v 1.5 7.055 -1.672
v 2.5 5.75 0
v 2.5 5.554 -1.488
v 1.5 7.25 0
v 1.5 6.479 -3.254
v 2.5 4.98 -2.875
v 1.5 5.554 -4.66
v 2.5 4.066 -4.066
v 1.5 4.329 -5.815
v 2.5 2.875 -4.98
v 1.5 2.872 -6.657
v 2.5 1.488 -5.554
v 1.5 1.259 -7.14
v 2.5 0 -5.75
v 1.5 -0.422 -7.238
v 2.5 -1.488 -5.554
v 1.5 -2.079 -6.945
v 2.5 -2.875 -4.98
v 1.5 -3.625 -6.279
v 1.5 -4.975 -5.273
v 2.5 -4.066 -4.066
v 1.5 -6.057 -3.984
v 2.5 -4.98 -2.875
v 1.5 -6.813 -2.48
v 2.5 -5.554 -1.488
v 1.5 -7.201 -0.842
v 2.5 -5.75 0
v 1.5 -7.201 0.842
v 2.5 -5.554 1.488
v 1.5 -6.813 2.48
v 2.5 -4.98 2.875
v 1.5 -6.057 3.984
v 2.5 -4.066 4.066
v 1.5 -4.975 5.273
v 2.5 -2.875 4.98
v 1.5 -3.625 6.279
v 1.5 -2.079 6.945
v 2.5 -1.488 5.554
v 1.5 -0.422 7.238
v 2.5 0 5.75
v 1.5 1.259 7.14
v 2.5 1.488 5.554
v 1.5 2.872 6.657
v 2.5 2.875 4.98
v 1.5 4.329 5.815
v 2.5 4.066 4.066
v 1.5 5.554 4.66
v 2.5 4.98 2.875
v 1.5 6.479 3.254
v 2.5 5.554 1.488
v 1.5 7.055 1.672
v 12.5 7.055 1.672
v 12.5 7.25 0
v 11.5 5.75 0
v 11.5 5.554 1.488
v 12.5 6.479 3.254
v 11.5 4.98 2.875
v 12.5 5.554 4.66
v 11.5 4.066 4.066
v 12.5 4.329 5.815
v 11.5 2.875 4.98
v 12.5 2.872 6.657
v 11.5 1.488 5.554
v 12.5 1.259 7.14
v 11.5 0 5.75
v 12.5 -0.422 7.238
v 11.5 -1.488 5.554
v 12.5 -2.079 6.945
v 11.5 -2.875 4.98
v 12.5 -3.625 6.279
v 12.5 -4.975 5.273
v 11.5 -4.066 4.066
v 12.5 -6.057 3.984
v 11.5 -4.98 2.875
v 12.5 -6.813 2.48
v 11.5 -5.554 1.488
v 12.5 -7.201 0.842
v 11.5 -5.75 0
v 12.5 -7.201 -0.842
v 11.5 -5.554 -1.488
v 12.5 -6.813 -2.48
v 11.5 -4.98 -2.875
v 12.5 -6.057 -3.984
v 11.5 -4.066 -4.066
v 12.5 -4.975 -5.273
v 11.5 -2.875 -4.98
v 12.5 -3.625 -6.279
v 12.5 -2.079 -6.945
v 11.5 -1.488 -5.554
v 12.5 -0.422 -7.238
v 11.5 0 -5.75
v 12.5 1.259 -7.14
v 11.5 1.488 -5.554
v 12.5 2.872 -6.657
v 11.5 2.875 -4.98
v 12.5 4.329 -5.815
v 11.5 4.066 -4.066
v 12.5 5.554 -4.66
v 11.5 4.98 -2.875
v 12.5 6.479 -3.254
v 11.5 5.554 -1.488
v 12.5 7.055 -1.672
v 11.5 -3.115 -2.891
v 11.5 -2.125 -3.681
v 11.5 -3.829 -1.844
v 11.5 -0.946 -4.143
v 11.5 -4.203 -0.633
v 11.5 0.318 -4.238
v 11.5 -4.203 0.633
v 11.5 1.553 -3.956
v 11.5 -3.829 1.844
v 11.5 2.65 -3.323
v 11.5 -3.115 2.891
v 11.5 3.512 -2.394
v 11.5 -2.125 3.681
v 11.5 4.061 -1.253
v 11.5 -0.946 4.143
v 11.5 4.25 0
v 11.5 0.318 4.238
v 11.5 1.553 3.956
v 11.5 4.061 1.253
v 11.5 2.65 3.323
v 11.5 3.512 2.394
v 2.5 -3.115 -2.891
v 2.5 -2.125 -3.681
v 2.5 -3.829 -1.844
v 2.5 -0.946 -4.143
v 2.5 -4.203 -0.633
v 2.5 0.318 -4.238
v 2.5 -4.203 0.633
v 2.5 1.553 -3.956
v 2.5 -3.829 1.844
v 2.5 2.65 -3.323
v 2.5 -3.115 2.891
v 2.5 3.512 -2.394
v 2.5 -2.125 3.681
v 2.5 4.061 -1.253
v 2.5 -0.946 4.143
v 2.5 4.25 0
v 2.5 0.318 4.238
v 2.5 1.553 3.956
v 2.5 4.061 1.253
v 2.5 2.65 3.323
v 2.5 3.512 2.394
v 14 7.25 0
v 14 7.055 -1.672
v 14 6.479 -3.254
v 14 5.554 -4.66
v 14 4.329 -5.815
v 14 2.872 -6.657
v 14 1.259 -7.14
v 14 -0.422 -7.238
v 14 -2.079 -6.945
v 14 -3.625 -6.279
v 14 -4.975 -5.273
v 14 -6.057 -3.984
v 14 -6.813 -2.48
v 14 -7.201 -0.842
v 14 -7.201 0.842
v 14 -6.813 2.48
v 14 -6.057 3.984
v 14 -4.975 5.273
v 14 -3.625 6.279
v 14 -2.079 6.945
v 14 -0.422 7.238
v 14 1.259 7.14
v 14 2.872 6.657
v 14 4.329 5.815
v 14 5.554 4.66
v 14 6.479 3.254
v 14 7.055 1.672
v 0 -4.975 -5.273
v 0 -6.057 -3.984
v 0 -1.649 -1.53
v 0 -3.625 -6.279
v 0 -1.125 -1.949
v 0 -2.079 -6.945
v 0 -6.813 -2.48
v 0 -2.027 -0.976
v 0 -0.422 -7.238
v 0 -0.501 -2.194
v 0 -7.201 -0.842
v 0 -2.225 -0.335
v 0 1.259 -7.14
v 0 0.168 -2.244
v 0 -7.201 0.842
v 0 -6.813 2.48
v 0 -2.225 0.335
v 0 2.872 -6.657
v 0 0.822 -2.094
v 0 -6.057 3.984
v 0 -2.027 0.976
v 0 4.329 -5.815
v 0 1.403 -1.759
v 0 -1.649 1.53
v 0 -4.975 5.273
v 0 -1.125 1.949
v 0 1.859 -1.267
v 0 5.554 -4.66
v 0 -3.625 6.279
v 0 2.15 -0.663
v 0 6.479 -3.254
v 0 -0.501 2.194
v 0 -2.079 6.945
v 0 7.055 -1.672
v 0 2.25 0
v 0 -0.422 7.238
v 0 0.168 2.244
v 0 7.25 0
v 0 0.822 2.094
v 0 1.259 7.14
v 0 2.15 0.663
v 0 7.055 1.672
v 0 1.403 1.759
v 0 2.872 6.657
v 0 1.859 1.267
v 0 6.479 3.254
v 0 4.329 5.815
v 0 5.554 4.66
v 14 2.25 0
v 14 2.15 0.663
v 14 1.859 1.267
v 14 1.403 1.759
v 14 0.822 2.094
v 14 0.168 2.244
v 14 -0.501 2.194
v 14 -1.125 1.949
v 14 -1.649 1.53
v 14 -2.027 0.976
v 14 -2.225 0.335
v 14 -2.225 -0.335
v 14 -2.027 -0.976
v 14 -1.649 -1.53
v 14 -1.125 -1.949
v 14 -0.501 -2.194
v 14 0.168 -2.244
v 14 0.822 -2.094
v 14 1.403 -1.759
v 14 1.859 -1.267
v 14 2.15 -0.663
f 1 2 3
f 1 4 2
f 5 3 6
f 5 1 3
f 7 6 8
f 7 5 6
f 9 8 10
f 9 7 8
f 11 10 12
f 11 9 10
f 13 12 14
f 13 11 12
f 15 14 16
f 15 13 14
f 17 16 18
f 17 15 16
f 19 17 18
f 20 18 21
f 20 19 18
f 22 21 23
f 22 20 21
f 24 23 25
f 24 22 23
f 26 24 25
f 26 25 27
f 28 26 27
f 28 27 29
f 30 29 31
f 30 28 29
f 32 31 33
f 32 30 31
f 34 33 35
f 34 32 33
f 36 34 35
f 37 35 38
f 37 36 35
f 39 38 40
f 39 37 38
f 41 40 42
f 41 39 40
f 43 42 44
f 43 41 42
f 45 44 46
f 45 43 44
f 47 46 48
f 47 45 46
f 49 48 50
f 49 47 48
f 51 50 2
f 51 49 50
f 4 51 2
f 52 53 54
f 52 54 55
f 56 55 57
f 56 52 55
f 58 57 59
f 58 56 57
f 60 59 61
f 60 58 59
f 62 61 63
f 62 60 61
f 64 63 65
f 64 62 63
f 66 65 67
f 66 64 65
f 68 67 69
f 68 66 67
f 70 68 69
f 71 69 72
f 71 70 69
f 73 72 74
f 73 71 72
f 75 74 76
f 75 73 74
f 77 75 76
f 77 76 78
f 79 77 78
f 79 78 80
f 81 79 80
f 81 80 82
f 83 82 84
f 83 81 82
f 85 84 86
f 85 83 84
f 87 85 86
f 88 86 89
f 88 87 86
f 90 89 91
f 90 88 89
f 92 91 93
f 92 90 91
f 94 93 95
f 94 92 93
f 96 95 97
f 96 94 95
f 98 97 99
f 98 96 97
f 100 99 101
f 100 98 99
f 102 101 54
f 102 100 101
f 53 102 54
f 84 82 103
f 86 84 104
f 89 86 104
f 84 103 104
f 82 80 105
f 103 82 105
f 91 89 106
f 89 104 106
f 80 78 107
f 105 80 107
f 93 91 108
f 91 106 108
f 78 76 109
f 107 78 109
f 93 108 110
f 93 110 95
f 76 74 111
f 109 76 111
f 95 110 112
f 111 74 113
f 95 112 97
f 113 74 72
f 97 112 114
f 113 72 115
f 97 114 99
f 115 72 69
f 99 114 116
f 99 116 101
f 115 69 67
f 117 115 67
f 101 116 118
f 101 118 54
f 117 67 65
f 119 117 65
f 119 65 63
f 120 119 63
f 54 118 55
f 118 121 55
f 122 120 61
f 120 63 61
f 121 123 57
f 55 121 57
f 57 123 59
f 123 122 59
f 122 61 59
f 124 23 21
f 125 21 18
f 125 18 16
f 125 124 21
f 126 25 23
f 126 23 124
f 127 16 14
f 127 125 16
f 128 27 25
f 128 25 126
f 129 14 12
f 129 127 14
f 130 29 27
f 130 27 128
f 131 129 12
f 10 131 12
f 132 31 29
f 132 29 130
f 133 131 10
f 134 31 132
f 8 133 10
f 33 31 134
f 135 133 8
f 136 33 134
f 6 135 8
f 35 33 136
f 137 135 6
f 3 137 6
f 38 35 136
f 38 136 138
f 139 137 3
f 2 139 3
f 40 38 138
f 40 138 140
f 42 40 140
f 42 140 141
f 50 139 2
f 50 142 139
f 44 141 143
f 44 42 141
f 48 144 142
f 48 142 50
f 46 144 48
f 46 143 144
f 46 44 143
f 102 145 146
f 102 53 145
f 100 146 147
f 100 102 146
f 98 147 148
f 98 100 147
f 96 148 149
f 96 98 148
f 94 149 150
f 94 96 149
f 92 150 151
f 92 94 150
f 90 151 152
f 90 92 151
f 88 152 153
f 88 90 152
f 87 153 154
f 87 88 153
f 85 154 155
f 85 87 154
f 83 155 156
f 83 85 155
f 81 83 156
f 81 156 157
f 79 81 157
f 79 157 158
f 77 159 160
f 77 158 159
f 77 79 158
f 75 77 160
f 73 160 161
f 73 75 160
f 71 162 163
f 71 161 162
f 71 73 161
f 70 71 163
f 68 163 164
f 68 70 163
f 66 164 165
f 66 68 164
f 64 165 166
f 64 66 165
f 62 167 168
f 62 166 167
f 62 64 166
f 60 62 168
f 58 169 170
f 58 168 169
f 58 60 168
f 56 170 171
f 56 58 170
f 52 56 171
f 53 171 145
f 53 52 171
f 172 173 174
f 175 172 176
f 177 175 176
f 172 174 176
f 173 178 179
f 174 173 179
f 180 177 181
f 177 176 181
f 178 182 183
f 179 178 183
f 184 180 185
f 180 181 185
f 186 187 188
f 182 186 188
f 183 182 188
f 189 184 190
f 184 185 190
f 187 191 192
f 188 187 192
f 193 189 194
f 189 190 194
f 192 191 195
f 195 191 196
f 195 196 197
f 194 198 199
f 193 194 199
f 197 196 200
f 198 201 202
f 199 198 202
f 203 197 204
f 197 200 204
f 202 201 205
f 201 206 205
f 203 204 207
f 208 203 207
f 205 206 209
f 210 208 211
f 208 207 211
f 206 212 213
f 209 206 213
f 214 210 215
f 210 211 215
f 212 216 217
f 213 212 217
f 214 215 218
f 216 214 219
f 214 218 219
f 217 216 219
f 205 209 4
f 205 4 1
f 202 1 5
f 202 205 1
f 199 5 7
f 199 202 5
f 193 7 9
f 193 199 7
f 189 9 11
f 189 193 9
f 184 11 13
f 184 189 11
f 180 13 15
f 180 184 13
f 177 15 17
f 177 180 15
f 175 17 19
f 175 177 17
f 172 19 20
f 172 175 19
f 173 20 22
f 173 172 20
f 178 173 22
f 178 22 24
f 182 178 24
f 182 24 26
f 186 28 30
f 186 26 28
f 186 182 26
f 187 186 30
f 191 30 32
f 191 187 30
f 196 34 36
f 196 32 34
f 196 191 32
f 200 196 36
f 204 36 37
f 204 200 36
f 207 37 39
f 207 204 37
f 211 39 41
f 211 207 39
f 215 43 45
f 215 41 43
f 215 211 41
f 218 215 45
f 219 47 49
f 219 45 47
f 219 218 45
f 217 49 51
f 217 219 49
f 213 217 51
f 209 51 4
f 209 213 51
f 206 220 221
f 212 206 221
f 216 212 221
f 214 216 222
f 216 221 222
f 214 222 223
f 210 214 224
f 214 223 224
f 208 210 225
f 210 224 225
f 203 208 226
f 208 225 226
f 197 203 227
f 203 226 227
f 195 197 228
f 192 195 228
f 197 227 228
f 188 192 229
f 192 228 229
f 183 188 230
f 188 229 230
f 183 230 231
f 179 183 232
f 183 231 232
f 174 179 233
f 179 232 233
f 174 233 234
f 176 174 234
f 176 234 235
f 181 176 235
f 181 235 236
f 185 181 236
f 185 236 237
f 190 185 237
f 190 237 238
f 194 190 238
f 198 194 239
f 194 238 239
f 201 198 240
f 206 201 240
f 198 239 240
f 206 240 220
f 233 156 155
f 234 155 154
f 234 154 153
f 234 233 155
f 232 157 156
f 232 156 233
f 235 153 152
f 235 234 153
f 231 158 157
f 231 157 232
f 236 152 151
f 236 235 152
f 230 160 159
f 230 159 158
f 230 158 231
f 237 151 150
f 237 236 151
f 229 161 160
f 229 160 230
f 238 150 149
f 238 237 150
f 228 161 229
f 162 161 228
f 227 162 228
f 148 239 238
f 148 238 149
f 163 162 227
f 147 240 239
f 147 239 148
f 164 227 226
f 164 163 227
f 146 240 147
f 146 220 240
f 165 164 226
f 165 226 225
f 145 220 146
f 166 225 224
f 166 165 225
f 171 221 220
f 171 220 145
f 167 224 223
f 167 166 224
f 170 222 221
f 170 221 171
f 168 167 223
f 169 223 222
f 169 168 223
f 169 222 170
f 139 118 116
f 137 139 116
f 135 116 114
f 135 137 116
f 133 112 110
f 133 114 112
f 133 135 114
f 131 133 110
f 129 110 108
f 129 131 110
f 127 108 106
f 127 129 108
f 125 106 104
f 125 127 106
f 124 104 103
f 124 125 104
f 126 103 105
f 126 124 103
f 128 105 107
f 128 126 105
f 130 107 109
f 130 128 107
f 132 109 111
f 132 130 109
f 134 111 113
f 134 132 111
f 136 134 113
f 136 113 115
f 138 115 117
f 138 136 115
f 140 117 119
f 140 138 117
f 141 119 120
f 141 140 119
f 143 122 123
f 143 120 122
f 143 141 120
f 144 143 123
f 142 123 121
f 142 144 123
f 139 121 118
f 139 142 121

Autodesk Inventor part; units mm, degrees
ref_plane "YZ Plane" through (0, 0, 0) normal (1, 0, 0) x (0, 1, 0)
ref_plane "XZ Plane" through (0, 0, 0) normal (0, 1, 0) x (-1, 0, 0)
ref_plane "XY Plane" through (0, 0, 0) normal (0, 0, 1) x (1, 0, 0)
sketch "Skizze1" plane through (0, 0, 0) normal (0, 0, 1) x (1, 0, 0)
  line L0 (0, 0) -> (14, 0)
  line L1 (0, 2.25) -> (14, 2.25)
  line L2 (14, 2.25) -> (14, 7.25)
  line L3 (14, 7.25) -> (11.5, 7.25)
  line L4 (11.5, 7.25) -> (11.5, 4.25)
  line L5 (11.5, 4.25) -> (2.5, 4.25)
  line L6 (2.5, 4.25) -> (2.5, 7.25)
  line L7 (2.5, 7.25) -> (0, 7.25)
  line L8 (0, 7.25) -> (0, 2.25)
  dimension "d0" = 14
  dimension "d1" = 4.5
  dimension "d2" = 2
  dimension "d3" = 3
  dimension "d4" = 3
  dimension "d5" = 9
revolve "Umdrehung1" add sketch "Skizze1" angle 360 about axis through (0, 0, 0) along (1, 0, 0)
chamfer "Fasen2" distance 1.5 distance2 1 1 edges at (2.5, -7.25, 0) measured on face at (2.5, 6.1798, -0.5783)
chamfer "Fasen3" distance 1 distance2 1.5 1 edges at (11.5, -7.25, 0) measured on face at (13.1667, 7.1561, -1.163)
properties part number "Hülse zum einhaken"
